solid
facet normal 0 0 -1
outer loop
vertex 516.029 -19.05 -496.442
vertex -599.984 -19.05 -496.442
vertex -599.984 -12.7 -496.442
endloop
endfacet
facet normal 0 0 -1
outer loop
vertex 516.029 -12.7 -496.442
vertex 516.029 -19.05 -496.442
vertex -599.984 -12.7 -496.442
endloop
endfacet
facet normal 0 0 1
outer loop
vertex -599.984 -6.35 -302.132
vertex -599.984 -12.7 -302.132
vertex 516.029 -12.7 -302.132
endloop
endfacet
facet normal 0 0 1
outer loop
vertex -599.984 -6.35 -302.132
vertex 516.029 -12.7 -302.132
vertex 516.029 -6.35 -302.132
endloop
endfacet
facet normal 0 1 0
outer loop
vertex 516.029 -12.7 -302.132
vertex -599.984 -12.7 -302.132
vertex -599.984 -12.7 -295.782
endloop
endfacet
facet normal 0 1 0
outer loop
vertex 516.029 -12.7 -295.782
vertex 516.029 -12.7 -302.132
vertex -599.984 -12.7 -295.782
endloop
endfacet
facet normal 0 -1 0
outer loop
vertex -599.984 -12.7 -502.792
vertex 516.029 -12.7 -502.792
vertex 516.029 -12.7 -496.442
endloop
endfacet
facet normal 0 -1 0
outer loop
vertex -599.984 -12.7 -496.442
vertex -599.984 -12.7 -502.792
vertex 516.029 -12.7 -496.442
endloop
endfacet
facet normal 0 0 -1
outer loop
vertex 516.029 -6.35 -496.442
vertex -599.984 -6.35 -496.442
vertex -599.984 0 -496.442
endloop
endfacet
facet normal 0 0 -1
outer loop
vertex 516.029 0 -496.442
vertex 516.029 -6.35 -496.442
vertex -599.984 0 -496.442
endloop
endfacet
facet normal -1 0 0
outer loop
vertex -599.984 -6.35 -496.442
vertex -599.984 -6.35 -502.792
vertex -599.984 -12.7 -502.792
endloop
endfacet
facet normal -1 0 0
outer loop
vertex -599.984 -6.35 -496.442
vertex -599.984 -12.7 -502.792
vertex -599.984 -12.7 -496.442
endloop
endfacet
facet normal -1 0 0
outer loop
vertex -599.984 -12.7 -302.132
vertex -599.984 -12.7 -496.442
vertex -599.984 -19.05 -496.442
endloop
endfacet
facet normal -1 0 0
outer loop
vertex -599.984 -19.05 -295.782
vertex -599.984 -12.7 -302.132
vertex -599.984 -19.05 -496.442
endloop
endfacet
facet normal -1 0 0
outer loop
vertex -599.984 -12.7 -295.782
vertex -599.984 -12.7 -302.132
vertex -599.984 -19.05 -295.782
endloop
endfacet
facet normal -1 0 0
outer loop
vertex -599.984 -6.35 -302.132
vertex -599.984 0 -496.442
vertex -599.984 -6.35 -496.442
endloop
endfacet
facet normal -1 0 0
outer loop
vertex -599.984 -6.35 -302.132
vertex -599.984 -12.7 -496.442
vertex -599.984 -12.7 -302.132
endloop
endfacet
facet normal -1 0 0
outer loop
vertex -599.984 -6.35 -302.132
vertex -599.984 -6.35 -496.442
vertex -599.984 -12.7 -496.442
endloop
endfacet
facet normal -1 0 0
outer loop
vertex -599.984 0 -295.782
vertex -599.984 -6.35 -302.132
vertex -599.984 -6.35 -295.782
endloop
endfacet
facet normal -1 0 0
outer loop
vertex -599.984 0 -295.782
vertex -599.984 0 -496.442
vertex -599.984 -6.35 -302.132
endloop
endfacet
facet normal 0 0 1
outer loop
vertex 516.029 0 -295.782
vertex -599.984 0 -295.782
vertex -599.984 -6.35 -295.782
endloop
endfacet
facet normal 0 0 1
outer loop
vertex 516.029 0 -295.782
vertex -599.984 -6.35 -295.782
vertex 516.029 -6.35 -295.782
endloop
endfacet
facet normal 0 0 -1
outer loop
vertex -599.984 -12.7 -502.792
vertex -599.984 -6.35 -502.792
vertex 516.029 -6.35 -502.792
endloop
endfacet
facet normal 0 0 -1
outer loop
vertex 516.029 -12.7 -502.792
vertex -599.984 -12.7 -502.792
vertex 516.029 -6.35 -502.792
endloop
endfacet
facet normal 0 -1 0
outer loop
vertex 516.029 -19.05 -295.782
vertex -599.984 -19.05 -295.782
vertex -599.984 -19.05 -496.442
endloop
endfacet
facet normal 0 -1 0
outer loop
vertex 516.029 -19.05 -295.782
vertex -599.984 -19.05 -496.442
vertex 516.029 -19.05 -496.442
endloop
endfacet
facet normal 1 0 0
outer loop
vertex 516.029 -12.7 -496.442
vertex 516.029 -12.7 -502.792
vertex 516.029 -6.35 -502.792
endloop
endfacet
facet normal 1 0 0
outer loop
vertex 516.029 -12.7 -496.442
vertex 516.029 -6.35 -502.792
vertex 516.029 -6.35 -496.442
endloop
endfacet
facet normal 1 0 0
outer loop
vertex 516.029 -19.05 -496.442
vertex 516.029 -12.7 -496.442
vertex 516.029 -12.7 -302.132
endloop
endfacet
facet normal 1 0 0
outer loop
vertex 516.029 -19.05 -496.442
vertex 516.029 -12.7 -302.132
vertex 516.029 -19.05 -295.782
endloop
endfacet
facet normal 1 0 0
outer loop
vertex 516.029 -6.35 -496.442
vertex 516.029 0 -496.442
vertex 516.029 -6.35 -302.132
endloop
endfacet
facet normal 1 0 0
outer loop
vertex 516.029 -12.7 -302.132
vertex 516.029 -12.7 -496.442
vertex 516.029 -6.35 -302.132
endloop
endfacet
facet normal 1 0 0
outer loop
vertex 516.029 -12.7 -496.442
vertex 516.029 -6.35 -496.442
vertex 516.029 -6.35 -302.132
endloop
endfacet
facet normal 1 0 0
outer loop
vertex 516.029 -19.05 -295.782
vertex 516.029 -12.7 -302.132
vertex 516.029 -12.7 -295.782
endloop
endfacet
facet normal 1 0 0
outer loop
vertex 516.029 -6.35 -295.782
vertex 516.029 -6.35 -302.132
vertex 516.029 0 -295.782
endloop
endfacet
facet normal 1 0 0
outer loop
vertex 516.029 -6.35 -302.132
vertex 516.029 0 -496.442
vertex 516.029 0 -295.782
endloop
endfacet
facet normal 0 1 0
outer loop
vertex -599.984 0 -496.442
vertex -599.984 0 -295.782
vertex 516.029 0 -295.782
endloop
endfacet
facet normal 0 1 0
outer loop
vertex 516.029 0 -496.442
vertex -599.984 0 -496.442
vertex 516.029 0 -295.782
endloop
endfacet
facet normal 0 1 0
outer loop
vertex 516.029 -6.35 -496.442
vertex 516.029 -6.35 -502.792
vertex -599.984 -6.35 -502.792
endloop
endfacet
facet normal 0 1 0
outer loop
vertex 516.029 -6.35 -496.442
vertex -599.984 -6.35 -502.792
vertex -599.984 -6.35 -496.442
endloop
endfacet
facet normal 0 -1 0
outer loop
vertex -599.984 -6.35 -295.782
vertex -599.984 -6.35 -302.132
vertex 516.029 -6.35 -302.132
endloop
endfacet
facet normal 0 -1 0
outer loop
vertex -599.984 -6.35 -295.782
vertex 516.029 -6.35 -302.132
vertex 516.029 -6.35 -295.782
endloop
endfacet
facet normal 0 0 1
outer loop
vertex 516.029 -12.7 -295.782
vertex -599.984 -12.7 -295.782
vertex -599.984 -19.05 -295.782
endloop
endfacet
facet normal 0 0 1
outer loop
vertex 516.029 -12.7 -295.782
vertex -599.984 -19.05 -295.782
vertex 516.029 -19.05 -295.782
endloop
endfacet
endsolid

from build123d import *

# Parameters (mm, degrees)
F0_W     = 1116.0125
F0_H     = 207.01
F1_DEPTH = 19.05
F2_W     = 6.35
F2_H     = 6.35
F3_DEPTH = 1116.0135
F4_W     = 6.35
F4_H     = 6.35
F5_DEPTH = 1116.0135


with BuildPart() as f1:
    # F0 (on Front) → F1 (new body)
    with BuildSketch(Plane.XZ):
        with Locations((-41.97727, -399.287407)):
            Rectangle(F0_W, F0_H)
    extrude(amount=F1_DEPTH)

    # F2 (on face) → F3 (cut, through all)
    with BuildSketch(Plane.YZ.offset(516.02898)):
        with Locations((-9.525, -298.957407)):
            Rectangle(F2_W, F2_H)
    extrude(amount=-F3_DEPTH, mode=Mode.SUBTRACT)

    # F4 (on face) → F5 (cut, through all)
    with BuildSketch(Plane.YZ.offset(516.02898)):
        with Locations((-15.875, -499.617407)):
            Rectangle(F4_W, F4_H)
        with Locations((-3.175, -499.617407)):
            Rectangle(F4_W, F4_H)
    extrude(amount=-F5_DEPTH, mode=Mode.SUBTRACT)


solid = f1.part
